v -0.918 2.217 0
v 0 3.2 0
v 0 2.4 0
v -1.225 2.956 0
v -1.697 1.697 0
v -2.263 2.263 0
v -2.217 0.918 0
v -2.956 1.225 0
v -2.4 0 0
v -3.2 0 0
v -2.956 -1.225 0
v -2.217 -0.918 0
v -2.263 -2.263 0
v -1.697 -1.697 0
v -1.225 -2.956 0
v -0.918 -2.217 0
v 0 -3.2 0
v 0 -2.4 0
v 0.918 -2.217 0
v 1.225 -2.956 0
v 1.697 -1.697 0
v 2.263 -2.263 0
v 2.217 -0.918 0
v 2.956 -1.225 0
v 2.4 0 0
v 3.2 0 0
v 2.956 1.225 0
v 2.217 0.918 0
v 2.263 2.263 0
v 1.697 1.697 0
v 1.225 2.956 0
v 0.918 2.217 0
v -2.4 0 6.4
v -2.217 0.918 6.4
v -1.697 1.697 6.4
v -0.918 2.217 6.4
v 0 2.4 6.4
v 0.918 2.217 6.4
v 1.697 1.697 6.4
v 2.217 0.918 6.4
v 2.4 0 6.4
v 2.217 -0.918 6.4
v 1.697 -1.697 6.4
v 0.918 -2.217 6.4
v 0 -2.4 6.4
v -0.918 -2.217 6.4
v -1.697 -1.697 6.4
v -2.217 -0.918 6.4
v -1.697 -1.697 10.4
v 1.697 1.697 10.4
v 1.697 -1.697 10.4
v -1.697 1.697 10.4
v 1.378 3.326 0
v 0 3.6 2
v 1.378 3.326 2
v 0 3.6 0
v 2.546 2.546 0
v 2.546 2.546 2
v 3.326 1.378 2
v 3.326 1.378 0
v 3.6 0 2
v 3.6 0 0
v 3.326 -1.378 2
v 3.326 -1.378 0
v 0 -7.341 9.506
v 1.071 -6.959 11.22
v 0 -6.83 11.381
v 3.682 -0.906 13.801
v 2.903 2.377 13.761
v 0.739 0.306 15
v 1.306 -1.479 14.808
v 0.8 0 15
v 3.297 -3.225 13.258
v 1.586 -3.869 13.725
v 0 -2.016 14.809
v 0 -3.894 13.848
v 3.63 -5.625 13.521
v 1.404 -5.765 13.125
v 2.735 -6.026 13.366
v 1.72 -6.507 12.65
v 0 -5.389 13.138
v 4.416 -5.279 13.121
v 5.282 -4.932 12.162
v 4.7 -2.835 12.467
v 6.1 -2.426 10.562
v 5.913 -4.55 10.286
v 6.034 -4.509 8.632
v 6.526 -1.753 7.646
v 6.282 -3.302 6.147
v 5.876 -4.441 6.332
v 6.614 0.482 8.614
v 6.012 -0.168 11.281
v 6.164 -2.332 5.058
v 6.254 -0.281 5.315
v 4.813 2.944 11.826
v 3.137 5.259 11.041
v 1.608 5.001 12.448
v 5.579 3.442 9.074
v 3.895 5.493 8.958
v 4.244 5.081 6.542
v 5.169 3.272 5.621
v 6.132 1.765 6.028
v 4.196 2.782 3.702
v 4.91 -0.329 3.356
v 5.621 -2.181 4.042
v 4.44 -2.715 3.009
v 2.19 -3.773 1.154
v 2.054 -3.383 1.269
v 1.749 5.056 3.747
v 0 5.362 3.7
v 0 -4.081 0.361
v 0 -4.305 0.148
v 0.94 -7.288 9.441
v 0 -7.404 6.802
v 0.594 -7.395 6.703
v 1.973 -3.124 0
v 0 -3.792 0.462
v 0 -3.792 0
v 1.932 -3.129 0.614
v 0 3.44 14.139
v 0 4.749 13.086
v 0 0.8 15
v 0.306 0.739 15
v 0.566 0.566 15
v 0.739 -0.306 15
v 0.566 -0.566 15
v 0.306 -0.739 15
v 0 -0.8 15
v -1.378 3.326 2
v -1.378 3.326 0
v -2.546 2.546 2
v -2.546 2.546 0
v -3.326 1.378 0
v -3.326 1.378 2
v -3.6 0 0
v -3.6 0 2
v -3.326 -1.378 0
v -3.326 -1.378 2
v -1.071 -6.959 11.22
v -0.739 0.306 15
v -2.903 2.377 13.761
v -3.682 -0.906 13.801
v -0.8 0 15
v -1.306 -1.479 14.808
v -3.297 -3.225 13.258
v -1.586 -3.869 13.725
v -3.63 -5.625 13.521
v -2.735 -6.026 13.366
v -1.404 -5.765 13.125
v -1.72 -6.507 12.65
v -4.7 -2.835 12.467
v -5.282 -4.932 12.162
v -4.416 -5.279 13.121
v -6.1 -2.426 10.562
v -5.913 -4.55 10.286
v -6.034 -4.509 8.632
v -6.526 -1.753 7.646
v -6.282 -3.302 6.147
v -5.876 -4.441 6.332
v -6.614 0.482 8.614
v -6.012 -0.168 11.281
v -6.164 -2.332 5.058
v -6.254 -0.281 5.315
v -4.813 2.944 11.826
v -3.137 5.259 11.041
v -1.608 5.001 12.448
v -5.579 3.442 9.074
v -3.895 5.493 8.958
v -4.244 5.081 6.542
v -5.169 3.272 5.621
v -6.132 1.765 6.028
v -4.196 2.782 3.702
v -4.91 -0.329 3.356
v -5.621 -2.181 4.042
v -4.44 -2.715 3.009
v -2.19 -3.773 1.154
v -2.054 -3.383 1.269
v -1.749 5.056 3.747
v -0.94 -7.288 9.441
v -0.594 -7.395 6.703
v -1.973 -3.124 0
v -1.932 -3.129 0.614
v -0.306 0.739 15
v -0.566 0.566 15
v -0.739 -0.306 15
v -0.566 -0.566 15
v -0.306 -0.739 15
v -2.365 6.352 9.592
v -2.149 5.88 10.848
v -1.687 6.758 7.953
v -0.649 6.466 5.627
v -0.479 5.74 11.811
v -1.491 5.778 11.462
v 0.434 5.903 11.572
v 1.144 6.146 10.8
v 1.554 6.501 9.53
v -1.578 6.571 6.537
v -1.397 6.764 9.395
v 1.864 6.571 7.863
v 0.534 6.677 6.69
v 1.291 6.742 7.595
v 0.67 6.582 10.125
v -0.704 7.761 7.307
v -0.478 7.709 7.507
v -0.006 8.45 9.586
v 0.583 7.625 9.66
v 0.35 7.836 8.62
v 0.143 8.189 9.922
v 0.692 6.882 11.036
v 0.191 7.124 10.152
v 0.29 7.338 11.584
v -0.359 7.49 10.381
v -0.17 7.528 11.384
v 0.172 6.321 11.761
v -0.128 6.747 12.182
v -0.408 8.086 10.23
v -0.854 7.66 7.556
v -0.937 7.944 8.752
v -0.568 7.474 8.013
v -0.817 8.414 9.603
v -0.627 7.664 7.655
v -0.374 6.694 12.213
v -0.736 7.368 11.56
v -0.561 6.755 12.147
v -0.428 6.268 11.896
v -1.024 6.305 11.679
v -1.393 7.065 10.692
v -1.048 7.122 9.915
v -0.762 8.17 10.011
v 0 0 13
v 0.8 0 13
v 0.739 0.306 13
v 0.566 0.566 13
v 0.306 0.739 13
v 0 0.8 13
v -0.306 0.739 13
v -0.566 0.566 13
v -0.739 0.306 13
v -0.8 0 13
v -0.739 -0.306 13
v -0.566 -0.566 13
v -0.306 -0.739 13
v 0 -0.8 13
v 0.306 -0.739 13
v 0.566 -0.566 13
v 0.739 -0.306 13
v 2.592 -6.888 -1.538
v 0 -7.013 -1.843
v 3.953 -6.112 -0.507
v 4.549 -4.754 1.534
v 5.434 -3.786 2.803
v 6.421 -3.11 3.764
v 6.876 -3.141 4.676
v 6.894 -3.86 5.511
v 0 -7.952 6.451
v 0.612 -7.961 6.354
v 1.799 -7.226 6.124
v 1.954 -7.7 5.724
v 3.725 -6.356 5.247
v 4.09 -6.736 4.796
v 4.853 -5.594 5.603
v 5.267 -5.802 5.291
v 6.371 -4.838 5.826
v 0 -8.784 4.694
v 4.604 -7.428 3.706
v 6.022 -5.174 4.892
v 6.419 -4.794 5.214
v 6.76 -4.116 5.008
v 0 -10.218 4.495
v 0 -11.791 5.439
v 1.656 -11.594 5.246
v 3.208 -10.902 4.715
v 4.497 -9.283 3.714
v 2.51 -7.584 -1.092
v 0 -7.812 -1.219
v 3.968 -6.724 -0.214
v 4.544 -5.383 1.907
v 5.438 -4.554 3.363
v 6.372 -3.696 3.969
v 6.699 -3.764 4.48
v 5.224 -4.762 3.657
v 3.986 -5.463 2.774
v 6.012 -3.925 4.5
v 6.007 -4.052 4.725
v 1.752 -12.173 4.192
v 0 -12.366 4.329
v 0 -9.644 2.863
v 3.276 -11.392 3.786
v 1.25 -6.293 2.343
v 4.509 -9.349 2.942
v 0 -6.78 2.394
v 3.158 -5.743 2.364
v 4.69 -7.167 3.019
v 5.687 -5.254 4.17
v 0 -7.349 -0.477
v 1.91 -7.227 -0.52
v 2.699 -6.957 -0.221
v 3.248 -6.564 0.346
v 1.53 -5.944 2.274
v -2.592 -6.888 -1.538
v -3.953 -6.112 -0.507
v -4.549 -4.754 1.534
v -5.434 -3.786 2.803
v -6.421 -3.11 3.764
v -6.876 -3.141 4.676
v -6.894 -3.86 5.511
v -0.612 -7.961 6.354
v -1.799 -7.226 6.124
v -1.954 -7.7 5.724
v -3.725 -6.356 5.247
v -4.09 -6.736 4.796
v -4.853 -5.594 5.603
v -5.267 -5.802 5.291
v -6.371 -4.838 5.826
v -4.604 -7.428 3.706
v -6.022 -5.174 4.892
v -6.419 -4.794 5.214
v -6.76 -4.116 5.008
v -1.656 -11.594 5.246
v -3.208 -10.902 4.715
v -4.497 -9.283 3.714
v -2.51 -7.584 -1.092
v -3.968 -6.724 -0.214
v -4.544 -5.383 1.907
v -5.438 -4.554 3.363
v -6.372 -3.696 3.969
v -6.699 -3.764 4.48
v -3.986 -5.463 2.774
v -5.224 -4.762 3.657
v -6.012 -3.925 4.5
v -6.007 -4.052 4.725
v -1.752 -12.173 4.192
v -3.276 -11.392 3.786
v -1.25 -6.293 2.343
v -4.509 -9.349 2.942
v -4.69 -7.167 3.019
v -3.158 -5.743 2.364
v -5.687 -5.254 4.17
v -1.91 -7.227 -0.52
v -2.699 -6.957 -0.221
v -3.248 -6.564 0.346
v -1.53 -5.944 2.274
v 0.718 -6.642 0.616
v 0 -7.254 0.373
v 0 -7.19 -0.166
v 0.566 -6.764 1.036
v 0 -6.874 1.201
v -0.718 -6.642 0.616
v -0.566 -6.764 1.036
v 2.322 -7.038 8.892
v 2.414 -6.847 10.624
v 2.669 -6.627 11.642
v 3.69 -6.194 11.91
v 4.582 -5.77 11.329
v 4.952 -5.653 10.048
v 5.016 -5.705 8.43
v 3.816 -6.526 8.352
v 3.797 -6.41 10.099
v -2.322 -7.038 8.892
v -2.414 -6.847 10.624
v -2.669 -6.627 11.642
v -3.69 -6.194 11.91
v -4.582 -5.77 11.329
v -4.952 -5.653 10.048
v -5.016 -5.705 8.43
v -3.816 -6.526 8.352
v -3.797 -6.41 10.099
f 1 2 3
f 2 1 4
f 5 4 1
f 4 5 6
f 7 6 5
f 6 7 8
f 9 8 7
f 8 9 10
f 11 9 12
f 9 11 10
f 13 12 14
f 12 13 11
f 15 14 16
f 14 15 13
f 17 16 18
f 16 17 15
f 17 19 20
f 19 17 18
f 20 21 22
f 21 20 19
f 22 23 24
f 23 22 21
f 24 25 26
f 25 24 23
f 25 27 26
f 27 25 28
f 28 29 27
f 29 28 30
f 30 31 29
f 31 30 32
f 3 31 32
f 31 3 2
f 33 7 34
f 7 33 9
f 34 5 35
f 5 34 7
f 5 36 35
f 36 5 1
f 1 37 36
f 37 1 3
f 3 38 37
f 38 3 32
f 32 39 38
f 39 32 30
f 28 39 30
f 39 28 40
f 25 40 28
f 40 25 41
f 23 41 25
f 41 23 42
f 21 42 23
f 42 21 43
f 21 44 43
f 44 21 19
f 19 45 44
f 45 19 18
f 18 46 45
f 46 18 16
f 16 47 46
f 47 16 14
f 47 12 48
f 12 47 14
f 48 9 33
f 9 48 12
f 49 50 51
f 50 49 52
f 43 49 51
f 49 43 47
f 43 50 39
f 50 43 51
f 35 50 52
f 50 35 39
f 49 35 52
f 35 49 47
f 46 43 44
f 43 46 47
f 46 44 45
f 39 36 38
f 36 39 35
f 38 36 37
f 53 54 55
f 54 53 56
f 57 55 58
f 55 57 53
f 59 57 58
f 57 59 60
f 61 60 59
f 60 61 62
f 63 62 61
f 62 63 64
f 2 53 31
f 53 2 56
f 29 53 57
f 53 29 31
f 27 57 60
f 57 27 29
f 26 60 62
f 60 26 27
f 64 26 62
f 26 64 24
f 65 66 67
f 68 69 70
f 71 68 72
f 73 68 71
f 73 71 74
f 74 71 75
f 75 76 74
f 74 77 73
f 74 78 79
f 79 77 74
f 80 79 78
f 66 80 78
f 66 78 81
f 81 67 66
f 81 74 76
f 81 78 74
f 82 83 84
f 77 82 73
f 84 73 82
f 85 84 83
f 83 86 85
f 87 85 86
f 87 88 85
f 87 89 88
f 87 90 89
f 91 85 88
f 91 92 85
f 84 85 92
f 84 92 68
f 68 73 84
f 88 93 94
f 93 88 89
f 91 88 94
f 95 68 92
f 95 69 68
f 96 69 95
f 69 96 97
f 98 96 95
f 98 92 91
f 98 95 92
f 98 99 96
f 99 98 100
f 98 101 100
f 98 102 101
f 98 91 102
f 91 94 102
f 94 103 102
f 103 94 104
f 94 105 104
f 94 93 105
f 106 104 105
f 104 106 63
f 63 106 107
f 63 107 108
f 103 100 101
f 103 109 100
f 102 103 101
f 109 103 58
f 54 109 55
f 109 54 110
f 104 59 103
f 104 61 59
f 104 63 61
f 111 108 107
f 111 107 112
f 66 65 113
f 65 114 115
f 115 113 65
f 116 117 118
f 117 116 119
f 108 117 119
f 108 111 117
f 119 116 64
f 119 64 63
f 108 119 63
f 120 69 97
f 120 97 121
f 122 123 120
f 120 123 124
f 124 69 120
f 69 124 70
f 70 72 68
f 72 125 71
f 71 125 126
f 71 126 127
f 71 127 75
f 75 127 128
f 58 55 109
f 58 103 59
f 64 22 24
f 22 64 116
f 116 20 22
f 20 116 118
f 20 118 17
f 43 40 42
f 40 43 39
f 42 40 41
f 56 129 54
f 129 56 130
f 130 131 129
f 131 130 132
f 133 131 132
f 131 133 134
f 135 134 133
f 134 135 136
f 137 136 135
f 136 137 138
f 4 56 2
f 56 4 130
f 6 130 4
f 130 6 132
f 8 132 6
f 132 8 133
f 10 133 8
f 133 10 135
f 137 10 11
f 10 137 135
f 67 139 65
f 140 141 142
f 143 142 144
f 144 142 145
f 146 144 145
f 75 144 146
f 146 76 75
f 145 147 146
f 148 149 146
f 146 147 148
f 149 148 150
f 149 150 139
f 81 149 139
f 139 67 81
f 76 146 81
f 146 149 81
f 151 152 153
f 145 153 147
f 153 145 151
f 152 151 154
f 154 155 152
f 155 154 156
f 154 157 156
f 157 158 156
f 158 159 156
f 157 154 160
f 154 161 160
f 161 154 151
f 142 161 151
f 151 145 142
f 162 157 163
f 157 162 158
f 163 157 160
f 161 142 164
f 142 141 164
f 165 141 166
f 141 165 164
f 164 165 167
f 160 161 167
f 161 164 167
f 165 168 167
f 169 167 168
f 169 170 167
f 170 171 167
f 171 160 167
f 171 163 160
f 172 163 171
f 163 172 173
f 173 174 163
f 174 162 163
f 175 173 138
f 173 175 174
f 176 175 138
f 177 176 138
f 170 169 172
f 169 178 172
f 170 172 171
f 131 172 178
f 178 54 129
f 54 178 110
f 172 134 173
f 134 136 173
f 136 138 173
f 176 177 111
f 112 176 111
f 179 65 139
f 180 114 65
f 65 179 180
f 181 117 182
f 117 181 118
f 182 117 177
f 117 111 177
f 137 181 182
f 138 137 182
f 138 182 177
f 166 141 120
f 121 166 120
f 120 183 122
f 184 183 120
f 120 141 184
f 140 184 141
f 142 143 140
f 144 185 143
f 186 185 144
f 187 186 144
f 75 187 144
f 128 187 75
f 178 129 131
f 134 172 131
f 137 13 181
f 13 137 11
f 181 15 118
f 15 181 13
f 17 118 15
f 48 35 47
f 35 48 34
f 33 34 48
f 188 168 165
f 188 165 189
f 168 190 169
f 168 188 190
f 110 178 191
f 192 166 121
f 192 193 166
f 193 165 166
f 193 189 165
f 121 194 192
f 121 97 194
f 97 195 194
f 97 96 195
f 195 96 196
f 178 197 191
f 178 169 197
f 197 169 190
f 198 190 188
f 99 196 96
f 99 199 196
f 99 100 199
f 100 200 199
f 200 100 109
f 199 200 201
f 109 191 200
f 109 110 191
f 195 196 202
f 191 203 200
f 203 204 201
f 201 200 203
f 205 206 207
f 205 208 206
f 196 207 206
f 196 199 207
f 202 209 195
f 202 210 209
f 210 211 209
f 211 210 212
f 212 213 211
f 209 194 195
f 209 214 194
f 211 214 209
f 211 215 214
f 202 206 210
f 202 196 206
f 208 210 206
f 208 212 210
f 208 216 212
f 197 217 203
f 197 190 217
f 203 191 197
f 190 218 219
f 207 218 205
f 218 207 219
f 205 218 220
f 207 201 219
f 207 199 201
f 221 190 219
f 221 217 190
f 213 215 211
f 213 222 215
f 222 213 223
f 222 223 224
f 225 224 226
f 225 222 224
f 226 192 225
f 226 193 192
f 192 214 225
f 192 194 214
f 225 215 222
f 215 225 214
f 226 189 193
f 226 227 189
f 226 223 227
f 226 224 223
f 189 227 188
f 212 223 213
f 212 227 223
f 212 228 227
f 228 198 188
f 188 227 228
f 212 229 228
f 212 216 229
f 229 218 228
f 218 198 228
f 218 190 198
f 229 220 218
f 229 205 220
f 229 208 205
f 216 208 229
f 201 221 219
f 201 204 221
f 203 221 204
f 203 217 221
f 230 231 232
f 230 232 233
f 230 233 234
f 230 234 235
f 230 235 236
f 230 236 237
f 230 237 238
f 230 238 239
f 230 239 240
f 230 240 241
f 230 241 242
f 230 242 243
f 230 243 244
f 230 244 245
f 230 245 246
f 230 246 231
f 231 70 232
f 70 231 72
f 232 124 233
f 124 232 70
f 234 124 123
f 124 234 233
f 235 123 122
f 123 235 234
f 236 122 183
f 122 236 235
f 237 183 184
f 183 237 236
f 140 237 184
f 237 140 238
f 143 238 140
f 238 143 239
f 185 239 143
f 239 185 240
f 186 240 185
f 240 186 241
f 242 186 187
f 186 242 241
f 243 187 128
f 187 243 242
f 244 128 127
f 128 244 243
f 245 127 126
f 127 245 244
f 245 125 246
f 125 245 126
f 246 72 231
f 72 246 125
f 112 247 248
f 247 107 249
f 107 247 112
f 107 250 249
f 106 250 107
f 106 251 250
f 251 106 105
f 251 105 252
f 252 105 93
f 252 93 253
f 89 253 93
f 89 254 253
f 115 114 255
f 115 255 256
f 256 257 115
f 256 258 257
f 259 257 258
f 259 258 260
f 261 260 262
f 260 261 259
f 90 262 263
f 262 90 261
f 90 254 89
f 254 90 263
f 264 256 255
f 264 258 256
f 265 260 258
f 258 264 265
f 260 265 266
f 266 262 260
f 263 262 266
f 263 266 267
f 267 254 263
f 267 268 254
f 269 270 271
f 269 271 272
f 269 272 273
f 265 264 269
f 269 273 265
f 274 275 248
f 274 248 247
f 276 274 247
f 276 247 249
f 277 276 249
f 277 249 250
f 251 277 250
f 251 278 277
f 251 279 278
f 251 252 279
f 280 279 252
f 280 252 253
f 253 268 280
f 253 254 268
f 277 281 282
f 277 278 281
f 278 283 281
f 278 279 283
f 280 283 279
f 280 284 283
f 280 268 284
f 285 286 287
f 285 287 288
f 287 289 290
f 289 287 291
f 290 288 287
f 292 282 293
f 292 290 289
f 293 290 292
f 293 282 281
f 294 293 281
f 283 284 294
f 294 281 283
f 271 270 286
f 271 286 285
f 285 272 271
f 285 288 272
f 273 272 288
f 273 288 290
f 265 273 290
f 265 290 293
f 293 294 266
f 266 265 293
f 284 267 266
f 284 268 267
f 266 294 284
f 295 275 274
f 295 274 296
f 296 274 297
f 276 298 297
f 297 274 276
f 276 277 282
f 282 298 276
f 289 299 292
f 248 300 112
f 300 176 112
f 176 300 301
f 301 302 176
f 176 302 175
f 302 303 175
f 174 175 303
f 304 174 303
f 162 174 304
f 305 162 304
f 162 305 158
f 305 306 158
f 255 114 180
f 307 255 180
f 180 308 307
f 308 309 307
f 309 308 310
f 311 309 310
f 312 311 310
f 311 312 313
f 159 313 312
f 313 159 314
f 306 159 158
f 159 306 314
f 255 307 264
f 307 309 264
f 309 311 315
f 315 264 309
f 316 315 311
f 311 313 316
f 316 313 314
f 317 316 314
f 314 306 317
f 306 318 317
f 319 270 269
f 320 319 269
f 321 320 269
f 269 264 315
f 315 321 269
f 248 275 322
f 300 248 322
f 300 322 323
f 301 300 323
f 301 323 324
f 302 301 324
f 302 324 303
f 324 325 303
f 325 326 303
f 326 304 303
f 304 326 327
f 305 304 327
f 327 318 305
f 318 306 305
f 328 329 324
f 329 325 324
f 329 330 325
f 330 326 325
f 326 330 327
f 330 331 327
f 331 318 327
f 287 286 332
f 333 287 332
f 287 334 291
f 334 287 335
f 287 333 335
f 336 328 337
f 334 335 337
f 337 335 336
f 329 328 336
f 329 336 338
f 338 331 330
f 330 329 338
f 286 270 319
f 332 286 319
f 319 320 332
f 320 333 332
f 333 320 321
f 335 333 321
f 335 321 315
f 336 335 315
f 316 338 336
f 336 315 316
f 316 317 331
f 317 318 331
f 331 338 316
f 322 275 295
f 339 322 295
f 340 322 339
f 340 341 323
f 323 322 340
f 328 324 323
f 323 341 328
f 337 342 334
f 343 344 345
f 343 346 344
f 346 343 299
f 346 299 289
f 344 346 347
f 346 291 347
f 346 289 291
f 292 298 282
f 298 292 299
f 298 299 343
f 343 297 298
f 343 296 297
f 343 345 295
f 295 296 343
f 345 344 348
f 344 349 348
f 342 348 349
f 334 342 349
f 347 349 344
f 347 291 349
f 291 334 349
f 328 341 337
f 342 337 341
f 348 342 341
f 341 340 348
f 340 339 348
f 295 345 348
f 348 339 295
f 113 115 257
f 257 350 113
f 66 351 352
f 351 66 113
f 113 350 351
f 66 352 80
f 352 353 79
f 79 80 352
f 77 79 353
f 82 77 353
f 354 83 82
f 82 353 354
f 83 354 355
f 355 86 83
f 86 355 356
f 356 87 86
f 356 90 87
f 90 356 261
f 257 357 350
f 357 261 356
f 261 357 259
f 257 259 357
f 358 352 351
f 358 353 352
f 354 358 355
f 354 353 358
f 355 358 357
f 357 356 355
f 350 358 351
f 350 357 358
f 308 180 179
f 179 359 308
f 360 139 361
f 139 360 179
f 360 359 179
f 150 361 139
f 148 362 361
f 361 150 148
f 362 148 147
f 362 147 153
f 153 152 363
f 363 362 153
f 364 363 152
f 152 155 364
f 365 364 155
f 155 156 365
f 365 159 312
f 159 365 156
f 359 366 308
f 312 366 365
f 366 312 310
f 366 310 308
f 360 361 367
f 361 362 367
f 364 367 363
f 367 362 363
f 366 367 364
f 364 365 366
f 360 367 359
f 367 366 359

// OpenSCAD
use <../lib.scad>
use <s/24633s00.scad>
use <s/24633s02.scad>
use <s/24633s03.scad>
use <s/24633s04.scad>
function ldraw_lib__24633() = [
// 0 Minifig Head Duck
// 0 Name: 24633.dat
// 0 Author: Philippe Hurbain [Philo]
// 0 !LDRAW_ORG Part UPDATE 2024-06
// 0 !LICENSE Licensed under CC BY 4.0 : see CAreadme.txt
// 
// 0 BFC CERTIFY CCW
  [0,"BFC","CERTIFY"],
  [0,"BFC","CCW"],
// 
// 0 !KEYWORDS daisy, Disney, Donald
// 
// 0 !HISTORY 2022-02-12 {LEGO Instructions App} Original part shape
// 0 !HISTORY 2022-02-15 [Philo] File preparation for LDraw Parts Tracker
// 0 !HISTORY 2024-07-29 [OrionP] Official Update 2024-06
// 
// 
// 1 16 0 0 0 1 0 0 0 1 0 0 0 1 s\24633s00.dat
  [1,16,0,0,0,1,0,0,0,1,0,0,0,1, ldraw_lib__s__24633s00()],
// 1 16 0 0 0 1 0 0 0 1 0 0 0 1 s\24633s02.dat
  [1,16,0,0,0,1,0,0,0,1,0,0,0,1, ldraw_lib__s__24633s02()],
// 1 16 0 0 0 -1 0 0 0 1 0 0 0 1 s\24633s02.dat
  [1,16,0,0,0,-1,0,0,0,1,0,0,0,1, ldraw_lib__s__24633s02()],
// 1 16 0 0 0 1 0 0 0 1 0 0 0 1 s\24633s03.dat
  [1,16,0,0,0,1,0,0,0,1,0,0,0,1, ldraw_lib__s__24633s03()],
// 1 16 0 0 0 -1 0 0 0 1 0 0 0 1 s\24633s03.dat
  [1,16,0,0,0,-1,0,0,0,1,0,0,0,1, ldraw_lib__s__24633s03()],
// 1 16 0 0 0 1 0 0 0 1 0 0 0 1 s\24633s04.dat
  [1,16,0,0,0,1,0,0,0,1,0,0,0,1, ldraw_lib__s__24633s04()],
// 1 16 0 0 0 -1 0 0 0 1 0 0 0 1 s\24633s04.dat
  [1,16,0,0,0,-1,0,0,0,1,0,0,0,1, ldraw_lib__s__24633s04()],
];
module ldraw_lib__24633(step=0, col=false, unit=2/5, alt=false, line=0.2, solid=!$preview)
    makepoly(ldraw_lib__24633(), step=step, col=col, unit=unit, alt=alt, line=line, solid=solid);
ldraw_lib__24633(line=0.2);
